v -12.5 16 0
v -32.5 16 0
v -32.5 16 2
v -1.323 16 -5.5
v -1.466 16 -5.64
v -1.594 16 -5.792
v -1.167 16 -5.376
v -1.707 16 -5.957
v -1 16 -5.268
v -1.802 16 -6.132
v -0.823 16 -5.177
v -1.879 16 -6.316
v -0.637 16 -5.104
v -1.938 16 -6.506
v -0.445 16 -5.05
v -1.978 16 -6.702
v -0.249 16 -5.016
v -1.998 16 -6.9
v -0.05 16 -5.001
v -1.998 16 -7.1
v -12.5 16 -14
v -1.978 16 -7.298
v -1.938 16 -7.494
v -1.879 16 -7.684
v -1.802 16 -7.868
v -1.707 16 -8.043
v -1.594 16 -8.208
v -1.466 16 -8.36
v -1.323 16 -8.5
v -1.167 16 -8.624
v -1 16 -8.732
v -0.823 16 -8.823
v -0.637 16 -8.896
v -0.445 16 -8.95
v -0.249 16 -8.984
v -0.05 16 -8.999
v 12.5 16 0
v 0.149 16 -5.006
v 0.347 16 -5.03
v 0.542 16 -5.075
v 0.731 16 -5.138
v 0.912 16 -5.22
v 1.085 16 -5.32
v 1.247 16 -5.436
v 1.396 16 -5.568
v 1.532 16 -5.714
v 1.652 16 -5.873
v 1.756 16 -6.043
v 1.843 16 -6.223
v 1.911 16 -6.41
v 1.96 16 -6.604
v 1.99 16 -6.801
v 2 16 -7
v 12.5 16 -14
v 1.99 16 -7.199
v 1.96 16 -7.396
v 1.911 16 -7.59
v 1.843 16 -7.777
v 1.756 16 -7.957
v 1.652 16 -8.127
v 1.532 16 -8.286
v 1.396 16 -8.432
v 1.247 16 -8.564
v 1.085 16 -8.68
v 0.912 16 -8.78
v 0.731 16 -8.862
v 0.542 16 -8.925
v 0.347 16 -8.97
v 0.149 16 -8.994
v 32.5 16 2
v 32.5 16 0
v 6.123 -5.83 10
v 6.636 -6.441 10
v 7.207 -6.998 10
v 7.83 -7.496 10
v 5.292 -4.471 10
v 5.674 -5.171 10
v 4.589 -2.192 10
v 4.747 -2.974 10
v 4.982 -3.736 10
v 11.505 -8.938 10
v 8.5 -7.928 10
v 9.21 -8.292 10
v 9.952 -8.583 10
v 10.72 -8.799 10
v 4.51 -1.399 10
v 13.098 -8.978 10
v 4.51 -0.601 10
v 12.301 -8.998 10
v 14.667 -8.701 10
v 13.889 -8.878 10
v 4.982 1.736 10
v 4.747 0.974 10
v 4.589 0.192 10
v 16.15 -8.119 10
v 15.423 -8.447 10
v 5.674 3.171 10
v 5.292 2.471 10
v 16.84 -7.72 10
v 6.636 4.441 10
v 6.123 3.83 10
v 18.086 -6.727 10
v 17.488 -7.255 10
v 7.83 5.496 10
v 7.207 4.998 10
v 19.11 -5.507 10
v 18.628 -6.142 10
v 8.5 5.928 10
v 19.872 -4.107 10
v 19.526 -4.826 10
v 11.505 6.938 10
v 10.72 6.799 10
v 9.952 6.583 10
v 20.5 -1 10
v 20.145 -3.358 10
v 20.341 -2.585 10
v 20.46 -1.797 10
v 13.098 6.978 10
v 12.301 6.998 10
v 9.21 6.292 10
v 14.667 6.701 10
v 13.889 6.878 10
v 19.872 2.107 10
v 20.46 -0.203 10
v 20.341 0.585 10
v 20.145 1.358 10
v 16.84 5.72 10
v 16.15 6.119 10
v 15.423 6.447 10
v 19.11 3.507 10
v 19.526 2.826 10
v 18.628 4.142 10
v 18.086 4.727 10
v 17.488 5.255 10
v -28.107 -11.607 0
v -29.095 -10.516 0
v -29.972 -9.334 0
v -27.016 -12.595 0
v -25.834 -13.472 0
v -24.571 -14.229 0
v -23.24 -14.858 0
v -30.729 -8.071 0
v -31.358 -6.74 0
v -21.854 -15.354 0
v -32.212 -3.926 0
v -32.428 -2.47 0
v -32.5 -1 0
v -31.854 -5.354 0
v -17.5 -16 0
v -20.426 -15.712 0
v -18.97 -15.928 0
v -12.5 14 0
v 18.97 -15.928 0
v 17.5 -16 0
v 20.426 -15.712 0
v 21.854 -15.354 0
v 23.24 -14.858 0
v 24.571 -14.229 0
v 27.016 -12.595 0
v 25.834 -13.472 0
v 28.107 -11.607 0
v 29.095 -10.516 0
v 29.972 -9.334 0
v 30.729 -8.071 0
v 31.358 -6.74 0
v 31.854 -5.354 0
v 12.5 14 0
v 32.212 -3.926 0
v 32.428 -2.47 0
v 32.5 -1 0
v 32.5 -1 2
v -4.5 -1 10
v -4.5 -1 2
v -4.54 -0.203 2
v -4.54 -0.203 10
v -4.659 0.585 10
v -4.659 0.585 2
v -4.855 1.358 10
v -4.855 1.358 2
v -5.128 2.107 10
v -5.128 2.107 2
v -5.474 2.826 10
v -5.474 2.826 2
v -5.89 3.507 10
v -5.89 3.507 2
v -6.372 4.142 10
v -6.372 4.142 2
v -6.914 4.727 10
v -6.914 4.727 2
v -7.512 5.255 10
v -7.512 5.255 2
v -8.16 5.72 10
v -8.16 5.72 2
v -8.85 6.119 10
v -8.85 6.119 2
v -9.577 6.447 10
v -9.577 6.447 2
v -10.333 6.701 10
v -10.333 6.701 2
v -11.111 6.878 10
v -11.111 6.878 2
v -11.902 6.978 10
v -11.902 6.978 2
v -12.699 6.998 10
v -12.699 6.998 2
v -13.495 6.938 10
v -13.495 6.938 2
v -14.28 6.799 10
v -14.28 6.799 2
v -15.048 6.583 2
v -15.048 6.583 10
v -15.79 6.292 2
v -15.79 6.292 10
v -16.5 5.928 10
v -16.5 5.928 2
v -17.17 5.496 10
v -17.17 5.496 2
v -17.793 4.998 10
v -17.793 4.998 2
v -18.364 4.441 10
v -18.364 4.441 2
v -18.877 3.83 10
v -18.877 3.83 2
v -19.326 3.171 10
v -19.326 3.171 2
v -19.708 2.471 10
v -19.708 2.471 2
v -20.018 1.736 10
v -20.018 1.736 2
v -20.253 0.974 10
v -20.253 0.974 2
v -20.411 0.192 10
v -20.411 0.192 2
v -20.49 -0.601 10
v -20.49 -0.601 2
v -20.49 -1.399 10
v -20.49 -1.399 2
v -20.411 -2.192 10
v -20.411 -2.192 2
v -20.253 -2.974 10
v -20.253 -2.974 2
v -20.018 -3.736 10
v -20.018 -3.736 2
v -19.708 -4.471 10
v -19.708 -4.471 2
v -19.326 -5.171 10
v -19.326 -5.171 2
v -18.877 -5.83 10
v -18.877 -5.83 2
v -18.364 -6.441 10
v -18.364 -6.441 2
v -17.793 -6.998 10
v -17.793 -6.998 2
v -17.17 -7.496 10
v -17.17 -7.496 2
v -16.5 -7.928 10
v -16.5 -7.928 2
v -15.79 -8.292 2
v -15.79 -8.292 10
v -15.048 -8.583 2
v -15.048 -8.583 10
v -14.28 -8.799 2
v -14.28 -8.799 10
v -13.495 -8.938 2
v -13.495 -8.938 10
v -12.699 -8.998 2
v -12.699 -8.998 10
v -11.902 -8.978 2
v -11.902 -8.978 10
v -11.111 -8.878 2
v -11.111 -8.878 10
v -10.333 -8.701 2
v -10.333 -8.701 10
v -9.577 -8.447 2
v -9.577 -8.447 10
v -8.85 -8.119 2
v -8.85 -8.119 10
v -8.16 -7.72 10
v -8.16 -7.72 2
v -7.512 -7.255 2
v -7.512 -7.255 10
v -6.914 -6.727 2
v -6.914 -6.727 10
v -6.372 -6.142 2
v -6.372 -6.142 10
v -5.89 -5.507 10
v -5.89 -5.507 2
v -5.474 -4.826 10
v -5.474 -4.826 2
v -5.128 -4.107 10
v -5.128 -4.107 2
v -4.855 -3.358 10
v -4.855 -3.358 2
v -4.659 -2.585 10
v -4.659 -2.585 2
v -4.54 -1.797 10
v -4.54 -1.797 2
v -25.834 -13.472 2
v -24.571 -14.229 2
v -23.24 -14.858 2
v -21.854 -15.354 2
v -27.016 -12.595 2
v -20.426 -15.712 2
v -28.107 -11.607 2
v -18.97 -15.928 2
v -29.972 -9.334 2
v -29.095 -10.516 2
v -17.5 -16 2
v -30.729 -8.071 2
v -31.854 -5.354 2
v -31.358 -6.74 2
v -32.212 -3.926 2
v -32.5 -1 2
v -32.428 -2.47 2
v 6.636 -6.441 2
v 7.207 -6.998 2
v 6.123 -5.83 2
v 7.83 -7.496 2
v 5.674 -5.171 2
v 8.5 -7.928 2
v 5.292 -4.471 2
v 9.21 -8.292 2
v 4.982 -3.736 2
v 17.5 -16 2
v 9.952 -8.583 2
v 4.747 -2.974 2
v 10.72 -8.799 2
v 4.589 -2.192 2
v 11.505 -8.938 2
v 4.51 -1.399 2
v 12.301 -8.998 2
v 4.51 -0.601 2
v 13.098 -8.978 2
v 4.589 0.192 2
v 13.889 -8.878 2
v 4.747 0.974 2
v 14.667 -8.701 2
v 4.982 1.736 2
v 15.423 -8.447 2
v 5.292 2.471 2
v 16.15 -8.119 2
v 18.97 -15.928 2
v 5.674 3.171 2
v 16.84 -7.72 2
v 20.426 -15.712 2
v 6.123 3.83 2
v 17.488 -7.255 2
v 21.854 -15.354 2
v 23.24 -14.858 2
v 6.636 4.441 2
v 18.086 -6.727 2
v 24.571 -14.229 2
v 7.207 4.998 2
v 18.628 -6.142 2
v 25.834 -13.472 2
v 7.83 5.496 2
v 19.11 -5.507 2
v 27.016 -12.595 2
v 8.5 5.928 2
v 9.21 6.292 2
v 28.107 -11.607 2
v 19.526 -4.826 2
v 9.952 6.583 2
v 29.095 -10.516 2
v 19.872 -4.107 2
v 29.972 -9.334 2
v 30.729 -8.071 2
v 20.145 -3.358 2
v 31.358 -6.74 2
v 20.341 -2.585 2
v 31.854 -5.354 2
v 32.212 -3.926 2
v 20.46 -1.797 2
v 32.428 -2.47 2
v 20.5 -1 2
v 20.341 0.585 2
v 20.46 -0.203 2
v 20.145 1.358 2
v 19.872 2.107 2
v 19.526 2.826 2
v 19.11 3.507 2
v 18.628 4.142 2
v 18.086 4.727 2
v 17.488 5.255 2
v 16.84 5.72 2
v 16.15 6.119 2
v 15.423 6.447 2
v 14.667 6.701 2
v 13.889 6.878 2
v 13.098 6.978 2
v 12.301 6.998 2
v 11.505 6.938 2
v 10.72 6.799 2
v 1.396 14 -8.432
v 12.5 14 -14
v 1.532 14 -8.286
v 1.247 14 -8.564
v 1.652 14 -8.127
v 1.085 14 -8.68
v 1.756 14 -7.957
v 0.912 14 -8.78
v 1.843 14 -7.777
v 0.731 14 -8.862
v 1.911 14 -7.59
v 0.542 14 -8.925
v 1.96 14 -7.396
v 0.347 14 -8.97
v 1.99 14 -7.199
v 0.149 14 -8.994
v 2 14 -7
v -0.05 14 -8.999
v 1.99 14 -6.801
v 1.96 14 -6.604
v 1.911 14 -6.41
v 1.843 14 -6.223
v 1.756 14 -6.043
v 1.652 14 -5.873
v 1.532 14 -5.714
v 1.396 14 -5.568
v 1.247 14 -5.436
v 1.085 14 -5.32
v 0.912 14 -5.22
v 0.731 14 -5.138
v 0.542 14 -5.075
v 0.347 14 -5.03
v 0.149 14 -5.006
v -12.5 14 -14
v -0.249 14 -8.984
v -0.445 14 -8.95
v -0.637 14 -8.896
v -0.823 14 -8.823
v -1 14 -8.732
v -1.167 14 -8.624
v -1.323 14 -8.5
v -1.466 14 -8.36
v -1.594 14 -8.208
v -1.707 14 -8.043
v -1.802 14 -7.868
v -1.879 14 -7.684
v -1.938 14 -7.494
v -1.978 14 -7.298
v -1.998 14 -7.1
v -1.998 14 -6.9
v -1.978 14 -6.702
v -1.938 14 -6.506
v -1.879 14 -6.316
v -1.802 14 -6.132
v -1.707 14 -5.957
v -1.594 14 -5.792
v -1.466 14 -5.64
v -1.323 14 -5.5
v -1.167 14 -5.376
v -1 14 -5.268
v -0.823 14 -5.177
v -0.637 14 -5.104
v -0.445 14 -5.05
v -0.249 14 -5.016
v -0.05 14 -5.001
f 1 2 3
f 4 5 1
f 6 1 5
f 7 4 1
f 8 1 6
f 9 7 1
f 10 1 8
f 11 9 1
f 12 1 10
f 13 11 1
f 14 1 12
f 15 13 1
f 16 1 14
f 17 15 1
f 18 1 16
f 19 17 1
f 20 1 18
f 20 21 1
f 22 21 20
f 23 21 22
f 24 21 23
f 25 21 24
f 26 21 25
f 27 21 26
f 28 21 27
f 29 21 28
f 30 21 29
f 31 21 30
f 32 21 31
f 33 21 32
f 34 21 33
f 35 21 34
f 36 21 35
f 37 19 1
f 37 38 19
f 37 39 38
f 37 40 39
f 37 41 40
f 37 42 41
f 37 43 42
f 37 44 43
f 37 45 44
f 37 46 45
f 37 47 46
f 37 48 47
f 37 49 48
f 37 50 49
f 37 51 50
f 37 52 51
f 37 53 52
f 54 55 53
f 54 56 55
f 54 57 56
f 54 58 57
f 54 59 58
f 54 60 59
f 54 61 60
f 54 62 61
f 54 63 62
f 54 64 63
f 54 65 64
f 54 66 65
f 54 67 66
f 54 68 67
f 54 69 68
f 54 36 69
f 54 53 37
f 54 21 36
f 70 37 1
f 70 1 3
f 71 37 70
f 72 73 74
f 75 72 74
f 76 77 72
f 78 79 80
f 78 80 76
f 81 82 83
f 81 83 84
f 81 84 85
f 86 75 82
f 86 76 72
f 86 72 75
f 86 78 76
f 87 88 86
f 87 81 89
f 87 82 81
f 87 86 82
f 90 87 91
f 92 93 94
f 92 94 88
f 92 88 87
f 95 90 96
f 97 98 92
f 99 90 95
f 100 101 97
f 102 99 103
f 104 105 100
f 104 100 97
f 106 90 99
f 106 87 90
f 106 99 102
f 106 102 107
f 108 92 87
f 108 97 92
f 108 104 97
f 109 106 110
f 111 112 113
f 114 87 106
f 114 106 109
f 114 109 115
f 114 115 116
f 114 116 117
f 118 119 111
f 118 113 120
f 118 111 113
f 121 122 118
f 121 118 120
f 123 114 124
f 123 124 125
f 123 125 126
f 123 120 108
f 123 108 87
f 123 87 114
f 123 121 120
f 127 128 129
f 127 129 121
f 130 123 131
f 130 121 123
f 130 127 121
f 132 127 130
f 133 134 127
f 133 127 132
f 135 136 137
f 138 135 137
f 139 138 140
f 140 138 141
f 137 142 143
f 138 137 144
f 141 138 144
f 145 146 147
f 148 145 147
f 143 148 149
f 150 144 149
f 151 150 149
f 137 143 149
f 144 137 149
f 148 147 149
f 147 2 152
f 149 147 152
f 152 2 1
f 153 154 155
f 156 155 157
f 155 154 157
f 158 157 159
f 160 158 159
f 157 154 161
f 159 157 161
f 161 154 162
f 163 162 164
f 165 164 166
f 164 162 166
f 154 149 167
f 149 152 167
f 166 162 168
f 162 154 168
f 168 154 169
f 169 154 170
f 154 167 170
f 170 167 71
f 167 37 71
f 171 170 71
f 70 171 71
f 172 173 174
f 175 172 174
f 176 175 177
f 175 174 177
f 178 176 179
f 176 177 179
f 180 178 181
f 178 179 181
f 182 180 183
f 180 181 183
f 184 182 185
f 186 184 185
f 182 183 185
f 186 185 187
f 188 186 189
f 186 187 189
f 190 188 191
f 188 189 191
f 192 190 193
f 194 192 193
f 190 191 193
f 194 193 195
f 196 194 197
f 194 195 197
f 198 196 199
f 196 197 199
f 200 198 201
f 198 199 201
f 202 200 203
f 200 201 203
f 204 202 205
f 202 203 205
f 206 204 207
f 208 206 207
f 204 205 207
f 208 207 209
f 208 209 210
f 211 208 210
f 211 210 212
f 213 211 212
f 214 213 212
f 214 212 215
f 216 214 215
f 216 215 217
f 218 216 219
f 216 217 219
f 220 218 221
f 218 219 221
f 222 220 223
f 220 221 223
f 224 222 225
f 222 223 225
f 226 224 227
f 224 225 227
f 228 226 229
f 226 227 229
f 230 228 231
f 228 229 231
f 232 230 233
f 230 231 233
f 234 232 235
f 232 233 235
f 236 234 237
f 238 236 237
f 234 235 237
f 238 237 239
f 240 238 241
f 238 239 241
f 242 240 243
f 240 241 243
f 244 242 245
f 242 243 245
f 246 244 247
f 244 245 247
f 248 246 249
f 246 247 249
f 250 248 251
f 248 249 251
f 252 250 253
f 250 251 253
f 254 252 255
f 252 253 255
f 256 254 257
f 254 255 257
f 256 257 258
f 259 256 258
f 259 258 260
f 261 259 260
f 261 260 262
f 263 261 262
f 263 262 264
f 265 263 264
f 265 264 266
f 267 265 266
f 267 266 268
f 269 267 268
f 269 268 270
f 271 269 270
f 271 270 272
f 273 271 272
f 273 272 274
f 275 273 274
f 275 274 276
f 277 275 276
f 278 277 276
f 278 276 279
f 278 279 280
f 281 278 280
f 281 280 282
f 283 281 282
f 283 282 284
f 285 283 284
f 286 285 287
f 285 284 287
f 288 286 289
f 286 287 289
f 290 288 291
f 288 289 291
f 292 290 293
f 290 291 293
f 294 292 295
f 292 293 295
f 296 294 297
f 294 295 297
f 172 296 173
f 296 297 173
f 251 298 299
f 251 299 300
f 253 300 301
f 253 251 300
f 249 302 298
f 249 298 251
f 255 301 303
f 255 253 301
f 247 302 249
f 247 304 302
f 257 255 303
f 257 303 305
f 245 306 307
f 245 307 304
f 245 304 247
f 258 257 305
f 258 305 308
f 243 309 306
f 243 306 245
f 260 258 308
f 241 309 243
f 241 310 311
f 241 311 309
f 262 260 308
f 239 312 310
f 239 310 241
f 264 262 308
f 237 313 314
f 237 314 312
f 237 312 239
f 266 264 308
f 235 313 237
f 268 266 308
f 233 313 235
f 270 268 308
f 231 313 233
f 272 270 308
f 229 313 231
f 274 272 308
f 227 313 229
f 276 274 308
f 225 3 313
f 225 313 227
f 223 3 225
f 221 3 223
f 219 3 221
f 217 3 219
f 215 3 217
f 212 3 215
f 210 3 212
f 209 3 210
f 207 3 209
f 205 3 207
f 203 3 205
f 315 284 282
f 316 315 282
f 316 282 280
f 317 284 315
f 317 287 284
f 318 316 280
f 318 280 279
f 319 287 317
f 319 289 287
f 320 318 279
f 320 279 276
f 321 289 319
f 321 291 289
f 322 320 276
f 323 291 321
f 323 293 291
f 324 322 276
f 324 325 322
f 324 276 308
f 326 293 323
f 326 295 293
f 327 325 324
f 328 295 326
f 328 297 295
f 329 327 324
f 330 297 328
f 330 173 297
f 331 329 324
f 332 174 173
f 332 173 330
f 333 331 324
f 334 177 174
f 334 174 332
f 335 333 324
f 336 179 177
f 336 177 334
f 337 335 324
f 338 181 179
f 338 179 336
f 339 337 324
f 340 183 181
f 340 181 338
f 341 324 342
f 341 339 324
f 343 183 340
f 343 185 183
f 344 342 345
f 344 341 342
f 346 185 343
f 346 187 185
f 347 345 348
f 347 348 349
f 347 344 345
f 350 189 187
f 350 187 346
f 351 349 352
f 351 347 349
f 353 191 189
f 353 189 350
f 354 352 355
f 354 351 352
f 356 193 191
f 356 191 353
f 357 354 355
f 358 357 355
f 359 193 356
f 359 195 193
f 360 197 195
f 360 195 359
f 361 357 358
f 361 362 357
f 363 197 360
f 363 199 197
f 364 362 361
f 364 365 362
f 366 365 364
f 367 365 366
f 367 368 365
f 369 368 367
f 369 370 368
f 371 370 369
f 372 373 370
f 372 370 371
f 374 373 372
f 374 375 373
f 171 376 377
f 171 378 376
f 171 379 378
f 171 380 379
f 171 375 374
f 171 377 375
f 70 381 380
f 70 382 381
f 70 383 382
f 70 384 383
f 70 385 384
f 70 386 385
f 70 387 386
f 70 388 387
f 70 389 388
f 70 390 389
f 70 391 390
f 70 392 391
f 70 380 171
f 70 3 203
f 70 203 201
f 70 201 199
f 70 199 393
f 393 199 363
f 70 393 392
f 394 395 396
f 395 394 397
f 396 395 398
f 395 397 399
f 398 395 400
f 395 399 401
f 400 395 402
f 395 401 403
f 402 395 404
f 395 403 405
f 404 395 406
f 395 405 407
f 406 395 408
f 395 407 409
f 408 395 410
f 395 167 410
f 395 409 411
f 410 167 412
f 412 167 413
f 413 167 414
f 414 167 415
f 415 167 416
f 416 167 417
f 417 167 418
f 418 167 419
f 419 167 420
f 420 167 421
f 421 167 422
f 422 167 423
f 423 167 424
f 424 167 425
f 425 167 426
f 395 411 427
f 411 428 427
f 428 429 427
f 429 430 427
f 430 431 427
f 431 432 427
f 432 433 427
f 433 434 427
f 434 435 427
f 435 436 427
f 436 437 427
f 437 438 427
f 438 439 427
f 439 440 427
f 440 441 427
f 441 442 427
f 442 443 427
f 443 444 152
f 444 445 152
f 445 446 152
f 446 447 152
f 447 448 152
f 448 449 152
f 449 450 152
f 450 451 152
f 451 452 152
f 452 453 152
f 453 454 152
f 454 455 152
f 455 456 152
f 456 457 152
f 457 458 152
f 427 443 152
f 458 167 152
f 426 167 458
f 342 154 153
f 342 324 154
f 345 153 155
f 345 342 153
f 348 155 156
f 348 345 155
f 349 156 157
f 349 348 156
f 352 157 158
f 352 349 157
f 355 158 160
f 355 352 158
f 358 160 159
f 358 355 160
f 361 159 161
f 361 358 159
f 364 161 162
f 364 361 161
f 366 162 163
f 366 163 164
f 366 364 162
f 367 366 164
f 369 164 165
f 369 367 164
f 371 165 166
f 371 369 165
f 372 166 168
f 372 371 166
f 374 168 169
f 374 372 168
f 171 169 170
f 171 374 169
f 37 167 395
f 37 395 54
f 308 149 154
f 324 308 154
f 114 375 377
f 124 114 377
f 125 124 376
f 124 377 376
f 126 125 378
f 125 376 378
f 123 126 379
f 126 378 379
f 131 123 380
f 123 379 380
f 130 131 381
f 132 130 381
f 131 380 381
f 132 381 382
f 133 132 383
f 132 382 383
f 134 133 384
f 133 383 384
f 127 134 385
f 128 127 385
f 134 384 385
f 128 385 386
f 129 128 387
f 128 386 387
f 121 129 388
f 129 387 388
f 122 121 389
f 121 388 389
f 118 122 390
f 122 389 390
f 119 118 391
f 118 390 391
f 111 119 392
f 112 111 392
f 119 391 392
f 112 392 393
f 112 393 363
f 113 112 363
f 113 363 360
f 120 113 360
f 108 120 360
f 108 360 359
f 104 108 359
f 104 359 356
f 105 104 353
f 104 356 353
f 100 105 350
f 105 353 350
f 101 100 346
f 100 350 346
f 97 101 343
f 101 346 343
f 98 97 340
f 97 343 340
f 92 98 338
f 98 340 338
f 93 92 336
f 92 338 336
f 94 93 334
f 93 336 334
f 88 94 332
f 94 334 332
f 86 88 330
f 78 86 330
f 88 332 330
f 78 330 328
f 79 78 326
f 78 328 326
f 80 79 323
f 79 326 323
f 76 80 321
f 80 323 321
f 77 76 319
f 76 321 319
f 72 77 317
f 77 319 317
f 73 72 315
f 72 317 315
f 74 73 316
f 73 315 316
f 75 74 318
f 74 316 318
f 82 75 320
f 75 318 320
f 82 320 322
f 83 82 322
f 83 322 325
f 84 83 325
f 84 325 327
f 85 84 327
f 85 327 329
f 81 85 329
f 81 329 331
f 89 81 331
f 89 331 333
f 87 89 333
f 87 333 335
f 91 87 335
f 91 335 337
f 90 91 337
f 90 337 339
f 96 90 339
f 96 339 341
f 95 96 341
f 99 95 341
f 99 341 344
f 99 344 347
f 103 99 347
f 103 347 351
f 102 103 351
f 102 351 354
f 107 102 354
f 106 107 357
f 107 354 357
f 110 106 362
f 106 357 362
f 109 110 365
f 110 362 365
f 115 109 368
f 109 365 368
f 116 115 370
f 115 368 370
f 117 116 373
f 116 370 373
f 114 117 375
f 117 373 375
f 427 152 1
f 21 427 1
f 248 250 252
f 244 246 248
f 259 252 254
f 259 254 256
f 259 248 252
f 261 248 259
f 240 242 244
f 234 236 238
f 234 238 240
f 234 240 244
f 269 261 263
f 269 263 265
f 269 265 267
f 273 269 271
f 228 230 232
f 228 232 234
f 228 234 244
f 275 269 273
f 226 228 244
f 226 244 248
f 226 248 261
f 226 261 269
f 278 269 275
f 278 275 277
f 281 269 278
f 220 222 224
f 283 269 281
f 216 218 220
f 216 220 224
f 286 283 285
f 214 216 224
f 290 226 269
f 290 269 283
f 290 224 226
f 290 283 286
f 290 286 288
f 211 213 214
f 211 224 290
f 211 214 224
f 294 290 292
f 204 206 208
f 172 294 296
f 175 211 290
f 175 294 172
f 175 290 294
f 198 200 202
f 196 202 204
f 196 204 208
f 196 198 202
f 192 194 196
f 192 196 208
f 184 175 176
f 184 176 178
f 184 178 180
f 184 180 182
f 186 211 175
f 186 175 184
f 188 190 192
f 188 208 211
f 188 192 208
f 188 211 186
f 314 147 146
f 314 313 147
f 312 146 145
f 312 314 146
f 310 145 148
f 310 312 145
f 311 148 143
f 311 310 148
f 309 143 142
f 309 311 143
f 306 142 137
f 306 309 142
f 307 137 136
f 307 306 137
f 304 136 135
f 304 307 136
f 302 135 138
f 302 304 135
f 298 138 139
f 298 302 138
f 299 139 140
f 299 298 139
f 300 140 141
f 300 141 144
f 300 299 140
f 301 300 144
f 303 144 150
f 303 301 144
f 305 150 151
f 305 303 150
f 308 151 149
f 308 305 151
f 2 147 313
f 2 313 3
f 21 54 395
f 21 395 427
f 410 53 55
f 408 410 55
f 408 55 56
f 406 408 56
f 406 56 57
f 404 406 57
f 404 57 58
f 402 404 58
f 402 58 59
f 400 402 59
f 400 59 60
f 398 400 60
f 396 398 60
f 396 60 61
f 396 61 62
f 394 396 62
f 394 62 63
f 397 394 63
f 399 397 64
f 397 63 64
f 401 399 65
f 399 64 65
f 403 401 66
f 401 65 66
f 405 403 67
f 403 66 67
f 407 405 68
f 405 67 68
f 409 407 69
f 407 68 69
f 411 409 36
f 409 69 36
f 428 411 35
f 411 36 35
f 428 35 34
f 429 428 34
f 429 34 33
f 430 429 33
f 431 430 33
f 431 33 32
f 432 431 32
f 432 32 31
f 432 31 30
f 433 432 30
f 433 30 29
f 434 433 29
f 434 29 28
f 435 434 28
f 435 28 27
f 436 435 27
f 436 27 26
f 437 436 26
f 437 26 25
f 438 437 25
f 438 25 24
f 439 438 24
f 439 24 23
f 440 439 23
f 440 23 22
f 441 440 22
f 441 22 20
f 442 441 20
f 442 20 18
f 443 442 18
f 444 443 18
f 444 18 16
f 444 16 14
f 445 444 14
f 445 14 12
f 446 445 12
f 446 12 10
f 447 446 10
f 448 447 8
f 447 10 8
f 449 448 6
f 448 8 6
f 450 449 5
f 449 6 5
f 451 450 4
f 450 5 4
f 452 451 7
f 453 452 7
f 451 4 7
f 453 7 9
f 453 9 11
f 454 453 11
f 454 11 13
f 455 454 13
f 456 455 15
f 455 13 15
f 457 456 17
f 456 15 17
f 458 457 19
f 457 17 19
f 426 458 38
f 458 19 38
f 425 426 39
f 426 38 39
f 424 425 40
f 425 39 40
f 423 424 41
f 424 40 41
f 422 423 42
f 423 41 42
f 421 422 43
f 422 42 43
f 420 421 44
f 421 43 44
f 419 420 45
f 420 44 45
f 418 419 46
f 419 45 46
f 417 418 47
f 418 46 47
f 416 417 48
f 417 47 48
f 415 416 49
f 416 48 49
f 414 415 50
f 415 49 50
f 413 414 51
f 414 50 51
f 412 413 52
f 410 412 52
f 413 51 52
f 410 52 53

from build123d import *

# Parameters (mm, degrees)
SKETCH1_W           = 65
SKETCH1_H           = 32
BOSS_EXTRUDE1_DEPTH = 2
SKETCH3_W           = 25
SKETCH3_H           = 2
BOSS_EXTRUDE2_DEPTH = 14
FILLET1_R           = 15
SKETCH4_R           = 2
CUT_EXTRUDE2_DEPTH  = 33
SKETCH2_R           = 8
BOSS_EXTRUDE3_DEPTH = 8


with BuildPart() as part:
    # Sketch1 → Boss-Extrude1 (new body)
    with BuildSketch(Plane.XY):
        Rectangle(SKETCH1_W, SKETCH1_H)
    extrude(amount=BOSS_EXTRUDE1_DEPTH)

    # Sketch3 → Boss-Extrude2 (add)
    with BuildSketch(Plane(origin=(0, 0, 0), x_dir=(-1, 0, 0), z_dir=(0, 0, -1))):
        with Locations((0, 15)):
            Rectangle(SKETCH3_W, SKETCH3_H)
    extrude(amount=BOSS_EXTRUDE2_DEPTH)

    # Fillet1
    fillet1_edges = [part.edges().sort_by_distance(p)[0] for p in [
        (32.5, -16, 1),
        (-32.5, -16, 1),
    ]]
    fillet(fillet1_edges, radius=FILLET1_R)

    # Sketch4 → Cut-Extrude2 (cut, through all)
    with BuildSketch(Plane(origin=(0, 16, 0), x_dir=(1, 0, 0), z_dir=(0, 1, 0))):
        with Locations((0, 7)):
            Circle(SKETCH4_R)
    extrude(amount=-CUT_EXTRUDE2_DEPTH, mode=Mode.SUBTRACT)

    # Sketch2 → Boss-Extrude3 (add)
    with BuildSketch(Plane.XY.offset(2)):
        with Locations((-12.5, -1)):
            Circle(SKETCH2_R)
        with Locations((12.5, -1)):
            Circle(SKETCH2_R)
    extrude(amount=BOSS_EXTRUDE3_DEPTH)


solid = part.part
